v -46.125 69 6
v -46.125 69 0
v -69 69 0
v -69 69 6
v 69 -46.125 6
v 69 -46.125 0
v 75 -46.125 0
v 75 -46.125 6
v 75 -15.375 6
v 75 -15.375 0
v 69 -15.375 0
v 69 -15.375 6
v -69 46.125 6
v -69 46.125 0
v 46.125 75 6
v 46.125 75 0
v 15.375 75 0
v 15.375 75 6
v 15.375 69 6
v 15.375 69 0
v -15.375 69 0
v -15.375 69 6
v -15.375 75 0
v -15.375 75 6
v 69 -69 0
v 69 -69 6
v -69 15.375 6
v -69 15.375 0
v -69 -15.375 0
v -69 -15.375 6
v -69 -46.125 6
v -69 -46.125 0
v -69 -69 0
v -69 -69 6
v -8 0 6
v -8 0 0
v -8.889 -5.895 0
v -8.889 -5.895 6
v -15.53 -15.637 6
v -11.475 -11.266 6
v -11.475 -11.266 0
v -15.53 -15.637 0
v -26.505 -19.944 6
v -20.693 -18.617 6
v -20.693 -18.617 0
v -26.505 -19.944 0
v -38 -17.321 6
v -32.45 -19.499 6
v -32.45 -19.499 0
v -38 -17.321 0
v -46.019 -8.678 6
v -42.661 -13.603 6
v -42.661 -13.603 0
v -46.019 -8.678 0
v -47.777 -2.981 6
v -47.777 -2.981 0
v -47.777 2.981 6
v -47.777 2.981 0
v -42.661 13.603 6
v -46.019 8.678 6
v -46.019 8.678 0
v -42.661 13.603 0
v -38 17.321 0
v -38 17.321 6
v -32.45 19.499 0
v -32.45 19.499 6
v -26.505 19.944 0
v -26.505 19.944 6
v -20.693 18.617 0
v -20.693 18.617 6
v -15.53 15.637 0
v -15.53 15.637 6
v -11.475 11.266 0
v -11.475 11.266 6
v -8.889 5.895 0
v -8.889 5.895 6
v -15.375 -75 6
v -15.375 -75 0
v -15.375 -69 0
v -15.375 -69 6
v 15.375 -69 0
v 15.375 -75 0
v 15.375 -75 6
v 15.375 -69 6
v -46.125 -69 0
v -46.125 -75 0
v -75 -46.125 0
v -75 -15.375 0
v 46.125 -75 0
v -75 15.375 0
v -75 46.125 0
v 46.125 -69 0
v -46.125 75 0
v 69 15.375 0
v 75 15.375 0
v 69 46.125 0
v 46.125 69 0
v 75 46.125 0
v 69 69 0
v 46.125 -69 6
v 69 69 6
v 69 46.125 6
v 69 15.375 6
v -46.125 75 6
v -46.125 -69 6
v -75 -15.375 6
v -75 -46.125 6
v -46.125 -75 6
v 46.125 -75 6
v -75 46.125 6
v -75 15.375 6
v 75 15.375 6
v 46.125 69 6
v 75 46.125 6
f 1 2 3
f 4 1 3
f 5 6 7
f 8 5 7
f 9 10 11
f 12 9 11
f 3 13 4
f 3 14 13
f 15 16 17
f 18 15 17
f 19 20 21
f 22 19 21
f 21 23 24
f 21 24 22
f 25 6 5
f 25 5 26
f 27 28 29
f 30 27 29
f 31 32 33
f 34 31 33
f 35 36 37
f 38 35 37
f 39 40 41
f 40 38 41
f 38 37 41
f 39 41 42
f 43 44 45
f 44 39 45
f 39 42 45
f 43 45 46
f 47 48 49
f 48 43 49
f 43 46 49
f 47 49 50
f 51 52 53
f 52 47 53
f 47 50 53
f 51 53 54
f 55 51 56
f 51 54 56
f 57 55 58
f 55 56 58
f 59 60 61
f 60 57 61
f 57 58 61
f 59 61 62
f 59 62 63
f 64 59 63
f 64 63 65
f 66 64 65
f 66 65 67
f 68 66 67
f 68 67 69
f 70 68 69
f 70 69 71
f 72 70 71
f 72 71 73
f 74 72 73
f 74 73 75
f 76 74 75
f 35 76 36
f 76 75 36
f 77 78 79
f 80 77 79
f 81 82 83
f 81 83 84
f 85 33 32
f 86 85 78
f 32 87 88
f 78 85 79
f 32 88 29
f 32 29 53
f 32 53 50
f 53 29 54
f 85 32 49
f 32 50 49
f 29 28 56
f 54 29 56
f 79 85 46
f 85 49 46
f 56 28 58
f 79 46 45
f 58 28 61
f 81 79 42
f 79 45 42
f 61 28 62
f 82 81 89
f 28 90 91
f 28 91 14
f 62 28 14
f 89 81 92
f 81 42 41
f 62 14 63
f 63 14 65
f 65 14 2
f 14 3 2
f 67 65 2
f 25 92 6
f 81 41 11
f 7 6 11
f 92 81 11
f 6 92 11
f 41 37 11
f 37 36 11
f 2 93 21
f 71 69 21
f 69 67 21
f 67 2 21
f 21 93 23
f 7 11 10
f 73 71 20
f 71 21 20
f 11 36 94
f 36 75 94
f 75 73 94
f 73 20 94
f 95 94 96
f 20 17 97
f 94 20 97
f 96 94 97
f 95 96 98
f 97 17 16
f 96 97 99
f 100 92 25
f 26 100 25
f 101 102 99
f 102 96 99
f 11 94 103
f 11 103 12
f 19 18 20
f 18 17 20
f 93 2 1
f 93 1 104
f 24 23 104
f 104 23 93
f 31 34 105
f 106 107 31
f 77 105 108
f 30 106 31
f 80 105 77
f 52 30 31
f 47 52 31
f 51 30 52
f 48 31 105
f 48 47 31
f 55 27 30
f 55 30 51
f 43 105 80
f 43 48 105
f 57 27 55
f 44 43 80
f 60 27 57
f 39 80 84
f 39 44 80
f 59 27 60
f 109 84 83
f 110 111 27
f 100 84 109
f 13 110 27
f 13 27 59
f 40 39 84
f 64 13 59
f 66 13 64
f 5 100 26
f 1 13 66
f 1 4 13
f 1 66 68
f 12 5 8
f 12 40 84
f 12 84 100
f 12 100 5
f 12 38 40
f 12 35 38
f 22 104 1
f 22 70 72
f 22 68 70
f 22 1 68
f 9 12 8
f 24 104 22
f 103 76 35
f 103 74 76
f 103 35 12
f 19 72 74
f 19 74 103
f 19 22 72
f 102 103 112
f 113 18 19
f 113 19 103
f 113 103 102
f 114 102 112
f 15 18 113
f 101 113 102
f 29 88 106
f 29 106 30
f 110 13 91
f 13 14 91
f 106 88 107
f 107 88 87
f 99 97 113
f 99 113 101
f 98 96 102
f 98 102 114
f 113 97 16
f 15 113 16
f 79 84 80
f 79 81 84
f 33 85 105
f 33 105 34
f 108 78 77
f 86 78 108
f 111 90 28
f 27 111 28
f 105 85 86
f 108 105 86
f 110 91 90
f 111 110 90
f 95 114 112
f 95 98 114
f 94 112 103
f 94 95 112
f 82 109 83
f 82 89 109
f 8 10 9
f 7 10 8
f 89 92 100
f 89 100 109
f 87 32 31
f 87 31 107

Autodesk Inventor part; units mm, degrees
ref_plane "YZ Plane" through (0, 0, 0) normal (1, 0, 0) x (0, 1, 0)
ref_plane "XZ Plane" through (0, 0, 0) normal (0, 1, 0) x (-1, 0, 0)
ref_plane "XY Plane" through (0, 0, 0) normal (0, 0, 1) x (1, 0, 0)
sketch "Sketch1" plane through (0, 0, 0) normal (0, 0, 1) x (1, 0, 0)
  line L0 (-75, -15.375) -> (-69, -15.375)
  line L1 (-69, -46.125) -> (-75, -46.125)
  line L2 (-69, 46.125) -> (-75, 46.125)
  line L3 (-75, 15.375) -> (-69, 15.375)
  line L4 (-69, 46.125) -> (-69, 69)
  line L5 (-75, 46.125) -> (-75, 15.375)
  line L6 (-69, 15.375) -> (-69, -15.375)
  line L7 (-75, -15.375) -> (-75, -46.125)
  line L8 (-69, -46.125) -> (-69, -69)
  line L9 (0, 0) -> (0, 15.375)
  line L10 (0, 0) -> (0, -46.125)
  line L11 (69, 15.375) -> (69, -15.375)
  line L12 (75, 15.375) -> (69, 15.375)
  line L13 (75, 46.125) -> (75, 15.375)
  line L14 (69, 46.125) -> (75, 46.125)
  line L15 (69, 46.125) -> (69, 69)
  line L16 (75, -15.375) -> (69, -15.375)
  line L17 (75, -15.375) -> (75, -46.125)
  line L18 (69, -46.125) -> (75, -46.125)
  line L19 (69, -46.125) -> (69, -69)
  line L20 (0, 0) -> (92.4518, 92.4518)
  line L21 (0, 0) -> (102.0745, -102.0745)
  line L22 (-15.375, 75) -> (-15.375, 69)
  line L23 (-46.125, 69) -> (-46.125, 75)
  line L24 (-15.375, 75) -> (-46.125, 75)
  line L25 (-46.125, 69) -> (-69, 69)
  line L26 (15.375, 69) -> (-15.375, 69)
  line L27 (15.375, 75) -> (15.375, 69)
  line L28 (46.125, 75) -> (15.375, 75)
  line L29 (46.125, 69) -> (46.125, 75)
  line L30 (46.125, 69) -> (69, 69)
  line L31 (46.125, -69) -> (46.125, -75)
  line L32 (46.125, -75) -> (15.375, -75)
  line L33 (46.125, -69) -> (69, -69)
  line L34 (-15.375, -75) -> (-15.375, -69)
  line L35 (15.375, -75) -> (15.375, -69)
  line L36 (15.375, -69) -> (-15.375, -69)
  line L37 (-15.375, -75) -> (-46.125, -75)
  line L38 (-46.125, -69) -> (-46.125, -75)
  line L39 (-46.125, -69) -> (-69, -69)
  line L40 (0, 0) -> (-28, 0)
  circle A0 centre (-28, 0) radius 20
  point P0 (0, 0)
  point P1 (0, 0)
  point P2 (-69, -75)
  point P3 (-69, 75)
  point P4 (69, -75)
  point P5 (69, 75)
  dimension "d1" = 28
  dimension "d2" = 40
extrude "Extrusion1" add sketch "Sketch1" along normal blind 6
properties part number "Top"
